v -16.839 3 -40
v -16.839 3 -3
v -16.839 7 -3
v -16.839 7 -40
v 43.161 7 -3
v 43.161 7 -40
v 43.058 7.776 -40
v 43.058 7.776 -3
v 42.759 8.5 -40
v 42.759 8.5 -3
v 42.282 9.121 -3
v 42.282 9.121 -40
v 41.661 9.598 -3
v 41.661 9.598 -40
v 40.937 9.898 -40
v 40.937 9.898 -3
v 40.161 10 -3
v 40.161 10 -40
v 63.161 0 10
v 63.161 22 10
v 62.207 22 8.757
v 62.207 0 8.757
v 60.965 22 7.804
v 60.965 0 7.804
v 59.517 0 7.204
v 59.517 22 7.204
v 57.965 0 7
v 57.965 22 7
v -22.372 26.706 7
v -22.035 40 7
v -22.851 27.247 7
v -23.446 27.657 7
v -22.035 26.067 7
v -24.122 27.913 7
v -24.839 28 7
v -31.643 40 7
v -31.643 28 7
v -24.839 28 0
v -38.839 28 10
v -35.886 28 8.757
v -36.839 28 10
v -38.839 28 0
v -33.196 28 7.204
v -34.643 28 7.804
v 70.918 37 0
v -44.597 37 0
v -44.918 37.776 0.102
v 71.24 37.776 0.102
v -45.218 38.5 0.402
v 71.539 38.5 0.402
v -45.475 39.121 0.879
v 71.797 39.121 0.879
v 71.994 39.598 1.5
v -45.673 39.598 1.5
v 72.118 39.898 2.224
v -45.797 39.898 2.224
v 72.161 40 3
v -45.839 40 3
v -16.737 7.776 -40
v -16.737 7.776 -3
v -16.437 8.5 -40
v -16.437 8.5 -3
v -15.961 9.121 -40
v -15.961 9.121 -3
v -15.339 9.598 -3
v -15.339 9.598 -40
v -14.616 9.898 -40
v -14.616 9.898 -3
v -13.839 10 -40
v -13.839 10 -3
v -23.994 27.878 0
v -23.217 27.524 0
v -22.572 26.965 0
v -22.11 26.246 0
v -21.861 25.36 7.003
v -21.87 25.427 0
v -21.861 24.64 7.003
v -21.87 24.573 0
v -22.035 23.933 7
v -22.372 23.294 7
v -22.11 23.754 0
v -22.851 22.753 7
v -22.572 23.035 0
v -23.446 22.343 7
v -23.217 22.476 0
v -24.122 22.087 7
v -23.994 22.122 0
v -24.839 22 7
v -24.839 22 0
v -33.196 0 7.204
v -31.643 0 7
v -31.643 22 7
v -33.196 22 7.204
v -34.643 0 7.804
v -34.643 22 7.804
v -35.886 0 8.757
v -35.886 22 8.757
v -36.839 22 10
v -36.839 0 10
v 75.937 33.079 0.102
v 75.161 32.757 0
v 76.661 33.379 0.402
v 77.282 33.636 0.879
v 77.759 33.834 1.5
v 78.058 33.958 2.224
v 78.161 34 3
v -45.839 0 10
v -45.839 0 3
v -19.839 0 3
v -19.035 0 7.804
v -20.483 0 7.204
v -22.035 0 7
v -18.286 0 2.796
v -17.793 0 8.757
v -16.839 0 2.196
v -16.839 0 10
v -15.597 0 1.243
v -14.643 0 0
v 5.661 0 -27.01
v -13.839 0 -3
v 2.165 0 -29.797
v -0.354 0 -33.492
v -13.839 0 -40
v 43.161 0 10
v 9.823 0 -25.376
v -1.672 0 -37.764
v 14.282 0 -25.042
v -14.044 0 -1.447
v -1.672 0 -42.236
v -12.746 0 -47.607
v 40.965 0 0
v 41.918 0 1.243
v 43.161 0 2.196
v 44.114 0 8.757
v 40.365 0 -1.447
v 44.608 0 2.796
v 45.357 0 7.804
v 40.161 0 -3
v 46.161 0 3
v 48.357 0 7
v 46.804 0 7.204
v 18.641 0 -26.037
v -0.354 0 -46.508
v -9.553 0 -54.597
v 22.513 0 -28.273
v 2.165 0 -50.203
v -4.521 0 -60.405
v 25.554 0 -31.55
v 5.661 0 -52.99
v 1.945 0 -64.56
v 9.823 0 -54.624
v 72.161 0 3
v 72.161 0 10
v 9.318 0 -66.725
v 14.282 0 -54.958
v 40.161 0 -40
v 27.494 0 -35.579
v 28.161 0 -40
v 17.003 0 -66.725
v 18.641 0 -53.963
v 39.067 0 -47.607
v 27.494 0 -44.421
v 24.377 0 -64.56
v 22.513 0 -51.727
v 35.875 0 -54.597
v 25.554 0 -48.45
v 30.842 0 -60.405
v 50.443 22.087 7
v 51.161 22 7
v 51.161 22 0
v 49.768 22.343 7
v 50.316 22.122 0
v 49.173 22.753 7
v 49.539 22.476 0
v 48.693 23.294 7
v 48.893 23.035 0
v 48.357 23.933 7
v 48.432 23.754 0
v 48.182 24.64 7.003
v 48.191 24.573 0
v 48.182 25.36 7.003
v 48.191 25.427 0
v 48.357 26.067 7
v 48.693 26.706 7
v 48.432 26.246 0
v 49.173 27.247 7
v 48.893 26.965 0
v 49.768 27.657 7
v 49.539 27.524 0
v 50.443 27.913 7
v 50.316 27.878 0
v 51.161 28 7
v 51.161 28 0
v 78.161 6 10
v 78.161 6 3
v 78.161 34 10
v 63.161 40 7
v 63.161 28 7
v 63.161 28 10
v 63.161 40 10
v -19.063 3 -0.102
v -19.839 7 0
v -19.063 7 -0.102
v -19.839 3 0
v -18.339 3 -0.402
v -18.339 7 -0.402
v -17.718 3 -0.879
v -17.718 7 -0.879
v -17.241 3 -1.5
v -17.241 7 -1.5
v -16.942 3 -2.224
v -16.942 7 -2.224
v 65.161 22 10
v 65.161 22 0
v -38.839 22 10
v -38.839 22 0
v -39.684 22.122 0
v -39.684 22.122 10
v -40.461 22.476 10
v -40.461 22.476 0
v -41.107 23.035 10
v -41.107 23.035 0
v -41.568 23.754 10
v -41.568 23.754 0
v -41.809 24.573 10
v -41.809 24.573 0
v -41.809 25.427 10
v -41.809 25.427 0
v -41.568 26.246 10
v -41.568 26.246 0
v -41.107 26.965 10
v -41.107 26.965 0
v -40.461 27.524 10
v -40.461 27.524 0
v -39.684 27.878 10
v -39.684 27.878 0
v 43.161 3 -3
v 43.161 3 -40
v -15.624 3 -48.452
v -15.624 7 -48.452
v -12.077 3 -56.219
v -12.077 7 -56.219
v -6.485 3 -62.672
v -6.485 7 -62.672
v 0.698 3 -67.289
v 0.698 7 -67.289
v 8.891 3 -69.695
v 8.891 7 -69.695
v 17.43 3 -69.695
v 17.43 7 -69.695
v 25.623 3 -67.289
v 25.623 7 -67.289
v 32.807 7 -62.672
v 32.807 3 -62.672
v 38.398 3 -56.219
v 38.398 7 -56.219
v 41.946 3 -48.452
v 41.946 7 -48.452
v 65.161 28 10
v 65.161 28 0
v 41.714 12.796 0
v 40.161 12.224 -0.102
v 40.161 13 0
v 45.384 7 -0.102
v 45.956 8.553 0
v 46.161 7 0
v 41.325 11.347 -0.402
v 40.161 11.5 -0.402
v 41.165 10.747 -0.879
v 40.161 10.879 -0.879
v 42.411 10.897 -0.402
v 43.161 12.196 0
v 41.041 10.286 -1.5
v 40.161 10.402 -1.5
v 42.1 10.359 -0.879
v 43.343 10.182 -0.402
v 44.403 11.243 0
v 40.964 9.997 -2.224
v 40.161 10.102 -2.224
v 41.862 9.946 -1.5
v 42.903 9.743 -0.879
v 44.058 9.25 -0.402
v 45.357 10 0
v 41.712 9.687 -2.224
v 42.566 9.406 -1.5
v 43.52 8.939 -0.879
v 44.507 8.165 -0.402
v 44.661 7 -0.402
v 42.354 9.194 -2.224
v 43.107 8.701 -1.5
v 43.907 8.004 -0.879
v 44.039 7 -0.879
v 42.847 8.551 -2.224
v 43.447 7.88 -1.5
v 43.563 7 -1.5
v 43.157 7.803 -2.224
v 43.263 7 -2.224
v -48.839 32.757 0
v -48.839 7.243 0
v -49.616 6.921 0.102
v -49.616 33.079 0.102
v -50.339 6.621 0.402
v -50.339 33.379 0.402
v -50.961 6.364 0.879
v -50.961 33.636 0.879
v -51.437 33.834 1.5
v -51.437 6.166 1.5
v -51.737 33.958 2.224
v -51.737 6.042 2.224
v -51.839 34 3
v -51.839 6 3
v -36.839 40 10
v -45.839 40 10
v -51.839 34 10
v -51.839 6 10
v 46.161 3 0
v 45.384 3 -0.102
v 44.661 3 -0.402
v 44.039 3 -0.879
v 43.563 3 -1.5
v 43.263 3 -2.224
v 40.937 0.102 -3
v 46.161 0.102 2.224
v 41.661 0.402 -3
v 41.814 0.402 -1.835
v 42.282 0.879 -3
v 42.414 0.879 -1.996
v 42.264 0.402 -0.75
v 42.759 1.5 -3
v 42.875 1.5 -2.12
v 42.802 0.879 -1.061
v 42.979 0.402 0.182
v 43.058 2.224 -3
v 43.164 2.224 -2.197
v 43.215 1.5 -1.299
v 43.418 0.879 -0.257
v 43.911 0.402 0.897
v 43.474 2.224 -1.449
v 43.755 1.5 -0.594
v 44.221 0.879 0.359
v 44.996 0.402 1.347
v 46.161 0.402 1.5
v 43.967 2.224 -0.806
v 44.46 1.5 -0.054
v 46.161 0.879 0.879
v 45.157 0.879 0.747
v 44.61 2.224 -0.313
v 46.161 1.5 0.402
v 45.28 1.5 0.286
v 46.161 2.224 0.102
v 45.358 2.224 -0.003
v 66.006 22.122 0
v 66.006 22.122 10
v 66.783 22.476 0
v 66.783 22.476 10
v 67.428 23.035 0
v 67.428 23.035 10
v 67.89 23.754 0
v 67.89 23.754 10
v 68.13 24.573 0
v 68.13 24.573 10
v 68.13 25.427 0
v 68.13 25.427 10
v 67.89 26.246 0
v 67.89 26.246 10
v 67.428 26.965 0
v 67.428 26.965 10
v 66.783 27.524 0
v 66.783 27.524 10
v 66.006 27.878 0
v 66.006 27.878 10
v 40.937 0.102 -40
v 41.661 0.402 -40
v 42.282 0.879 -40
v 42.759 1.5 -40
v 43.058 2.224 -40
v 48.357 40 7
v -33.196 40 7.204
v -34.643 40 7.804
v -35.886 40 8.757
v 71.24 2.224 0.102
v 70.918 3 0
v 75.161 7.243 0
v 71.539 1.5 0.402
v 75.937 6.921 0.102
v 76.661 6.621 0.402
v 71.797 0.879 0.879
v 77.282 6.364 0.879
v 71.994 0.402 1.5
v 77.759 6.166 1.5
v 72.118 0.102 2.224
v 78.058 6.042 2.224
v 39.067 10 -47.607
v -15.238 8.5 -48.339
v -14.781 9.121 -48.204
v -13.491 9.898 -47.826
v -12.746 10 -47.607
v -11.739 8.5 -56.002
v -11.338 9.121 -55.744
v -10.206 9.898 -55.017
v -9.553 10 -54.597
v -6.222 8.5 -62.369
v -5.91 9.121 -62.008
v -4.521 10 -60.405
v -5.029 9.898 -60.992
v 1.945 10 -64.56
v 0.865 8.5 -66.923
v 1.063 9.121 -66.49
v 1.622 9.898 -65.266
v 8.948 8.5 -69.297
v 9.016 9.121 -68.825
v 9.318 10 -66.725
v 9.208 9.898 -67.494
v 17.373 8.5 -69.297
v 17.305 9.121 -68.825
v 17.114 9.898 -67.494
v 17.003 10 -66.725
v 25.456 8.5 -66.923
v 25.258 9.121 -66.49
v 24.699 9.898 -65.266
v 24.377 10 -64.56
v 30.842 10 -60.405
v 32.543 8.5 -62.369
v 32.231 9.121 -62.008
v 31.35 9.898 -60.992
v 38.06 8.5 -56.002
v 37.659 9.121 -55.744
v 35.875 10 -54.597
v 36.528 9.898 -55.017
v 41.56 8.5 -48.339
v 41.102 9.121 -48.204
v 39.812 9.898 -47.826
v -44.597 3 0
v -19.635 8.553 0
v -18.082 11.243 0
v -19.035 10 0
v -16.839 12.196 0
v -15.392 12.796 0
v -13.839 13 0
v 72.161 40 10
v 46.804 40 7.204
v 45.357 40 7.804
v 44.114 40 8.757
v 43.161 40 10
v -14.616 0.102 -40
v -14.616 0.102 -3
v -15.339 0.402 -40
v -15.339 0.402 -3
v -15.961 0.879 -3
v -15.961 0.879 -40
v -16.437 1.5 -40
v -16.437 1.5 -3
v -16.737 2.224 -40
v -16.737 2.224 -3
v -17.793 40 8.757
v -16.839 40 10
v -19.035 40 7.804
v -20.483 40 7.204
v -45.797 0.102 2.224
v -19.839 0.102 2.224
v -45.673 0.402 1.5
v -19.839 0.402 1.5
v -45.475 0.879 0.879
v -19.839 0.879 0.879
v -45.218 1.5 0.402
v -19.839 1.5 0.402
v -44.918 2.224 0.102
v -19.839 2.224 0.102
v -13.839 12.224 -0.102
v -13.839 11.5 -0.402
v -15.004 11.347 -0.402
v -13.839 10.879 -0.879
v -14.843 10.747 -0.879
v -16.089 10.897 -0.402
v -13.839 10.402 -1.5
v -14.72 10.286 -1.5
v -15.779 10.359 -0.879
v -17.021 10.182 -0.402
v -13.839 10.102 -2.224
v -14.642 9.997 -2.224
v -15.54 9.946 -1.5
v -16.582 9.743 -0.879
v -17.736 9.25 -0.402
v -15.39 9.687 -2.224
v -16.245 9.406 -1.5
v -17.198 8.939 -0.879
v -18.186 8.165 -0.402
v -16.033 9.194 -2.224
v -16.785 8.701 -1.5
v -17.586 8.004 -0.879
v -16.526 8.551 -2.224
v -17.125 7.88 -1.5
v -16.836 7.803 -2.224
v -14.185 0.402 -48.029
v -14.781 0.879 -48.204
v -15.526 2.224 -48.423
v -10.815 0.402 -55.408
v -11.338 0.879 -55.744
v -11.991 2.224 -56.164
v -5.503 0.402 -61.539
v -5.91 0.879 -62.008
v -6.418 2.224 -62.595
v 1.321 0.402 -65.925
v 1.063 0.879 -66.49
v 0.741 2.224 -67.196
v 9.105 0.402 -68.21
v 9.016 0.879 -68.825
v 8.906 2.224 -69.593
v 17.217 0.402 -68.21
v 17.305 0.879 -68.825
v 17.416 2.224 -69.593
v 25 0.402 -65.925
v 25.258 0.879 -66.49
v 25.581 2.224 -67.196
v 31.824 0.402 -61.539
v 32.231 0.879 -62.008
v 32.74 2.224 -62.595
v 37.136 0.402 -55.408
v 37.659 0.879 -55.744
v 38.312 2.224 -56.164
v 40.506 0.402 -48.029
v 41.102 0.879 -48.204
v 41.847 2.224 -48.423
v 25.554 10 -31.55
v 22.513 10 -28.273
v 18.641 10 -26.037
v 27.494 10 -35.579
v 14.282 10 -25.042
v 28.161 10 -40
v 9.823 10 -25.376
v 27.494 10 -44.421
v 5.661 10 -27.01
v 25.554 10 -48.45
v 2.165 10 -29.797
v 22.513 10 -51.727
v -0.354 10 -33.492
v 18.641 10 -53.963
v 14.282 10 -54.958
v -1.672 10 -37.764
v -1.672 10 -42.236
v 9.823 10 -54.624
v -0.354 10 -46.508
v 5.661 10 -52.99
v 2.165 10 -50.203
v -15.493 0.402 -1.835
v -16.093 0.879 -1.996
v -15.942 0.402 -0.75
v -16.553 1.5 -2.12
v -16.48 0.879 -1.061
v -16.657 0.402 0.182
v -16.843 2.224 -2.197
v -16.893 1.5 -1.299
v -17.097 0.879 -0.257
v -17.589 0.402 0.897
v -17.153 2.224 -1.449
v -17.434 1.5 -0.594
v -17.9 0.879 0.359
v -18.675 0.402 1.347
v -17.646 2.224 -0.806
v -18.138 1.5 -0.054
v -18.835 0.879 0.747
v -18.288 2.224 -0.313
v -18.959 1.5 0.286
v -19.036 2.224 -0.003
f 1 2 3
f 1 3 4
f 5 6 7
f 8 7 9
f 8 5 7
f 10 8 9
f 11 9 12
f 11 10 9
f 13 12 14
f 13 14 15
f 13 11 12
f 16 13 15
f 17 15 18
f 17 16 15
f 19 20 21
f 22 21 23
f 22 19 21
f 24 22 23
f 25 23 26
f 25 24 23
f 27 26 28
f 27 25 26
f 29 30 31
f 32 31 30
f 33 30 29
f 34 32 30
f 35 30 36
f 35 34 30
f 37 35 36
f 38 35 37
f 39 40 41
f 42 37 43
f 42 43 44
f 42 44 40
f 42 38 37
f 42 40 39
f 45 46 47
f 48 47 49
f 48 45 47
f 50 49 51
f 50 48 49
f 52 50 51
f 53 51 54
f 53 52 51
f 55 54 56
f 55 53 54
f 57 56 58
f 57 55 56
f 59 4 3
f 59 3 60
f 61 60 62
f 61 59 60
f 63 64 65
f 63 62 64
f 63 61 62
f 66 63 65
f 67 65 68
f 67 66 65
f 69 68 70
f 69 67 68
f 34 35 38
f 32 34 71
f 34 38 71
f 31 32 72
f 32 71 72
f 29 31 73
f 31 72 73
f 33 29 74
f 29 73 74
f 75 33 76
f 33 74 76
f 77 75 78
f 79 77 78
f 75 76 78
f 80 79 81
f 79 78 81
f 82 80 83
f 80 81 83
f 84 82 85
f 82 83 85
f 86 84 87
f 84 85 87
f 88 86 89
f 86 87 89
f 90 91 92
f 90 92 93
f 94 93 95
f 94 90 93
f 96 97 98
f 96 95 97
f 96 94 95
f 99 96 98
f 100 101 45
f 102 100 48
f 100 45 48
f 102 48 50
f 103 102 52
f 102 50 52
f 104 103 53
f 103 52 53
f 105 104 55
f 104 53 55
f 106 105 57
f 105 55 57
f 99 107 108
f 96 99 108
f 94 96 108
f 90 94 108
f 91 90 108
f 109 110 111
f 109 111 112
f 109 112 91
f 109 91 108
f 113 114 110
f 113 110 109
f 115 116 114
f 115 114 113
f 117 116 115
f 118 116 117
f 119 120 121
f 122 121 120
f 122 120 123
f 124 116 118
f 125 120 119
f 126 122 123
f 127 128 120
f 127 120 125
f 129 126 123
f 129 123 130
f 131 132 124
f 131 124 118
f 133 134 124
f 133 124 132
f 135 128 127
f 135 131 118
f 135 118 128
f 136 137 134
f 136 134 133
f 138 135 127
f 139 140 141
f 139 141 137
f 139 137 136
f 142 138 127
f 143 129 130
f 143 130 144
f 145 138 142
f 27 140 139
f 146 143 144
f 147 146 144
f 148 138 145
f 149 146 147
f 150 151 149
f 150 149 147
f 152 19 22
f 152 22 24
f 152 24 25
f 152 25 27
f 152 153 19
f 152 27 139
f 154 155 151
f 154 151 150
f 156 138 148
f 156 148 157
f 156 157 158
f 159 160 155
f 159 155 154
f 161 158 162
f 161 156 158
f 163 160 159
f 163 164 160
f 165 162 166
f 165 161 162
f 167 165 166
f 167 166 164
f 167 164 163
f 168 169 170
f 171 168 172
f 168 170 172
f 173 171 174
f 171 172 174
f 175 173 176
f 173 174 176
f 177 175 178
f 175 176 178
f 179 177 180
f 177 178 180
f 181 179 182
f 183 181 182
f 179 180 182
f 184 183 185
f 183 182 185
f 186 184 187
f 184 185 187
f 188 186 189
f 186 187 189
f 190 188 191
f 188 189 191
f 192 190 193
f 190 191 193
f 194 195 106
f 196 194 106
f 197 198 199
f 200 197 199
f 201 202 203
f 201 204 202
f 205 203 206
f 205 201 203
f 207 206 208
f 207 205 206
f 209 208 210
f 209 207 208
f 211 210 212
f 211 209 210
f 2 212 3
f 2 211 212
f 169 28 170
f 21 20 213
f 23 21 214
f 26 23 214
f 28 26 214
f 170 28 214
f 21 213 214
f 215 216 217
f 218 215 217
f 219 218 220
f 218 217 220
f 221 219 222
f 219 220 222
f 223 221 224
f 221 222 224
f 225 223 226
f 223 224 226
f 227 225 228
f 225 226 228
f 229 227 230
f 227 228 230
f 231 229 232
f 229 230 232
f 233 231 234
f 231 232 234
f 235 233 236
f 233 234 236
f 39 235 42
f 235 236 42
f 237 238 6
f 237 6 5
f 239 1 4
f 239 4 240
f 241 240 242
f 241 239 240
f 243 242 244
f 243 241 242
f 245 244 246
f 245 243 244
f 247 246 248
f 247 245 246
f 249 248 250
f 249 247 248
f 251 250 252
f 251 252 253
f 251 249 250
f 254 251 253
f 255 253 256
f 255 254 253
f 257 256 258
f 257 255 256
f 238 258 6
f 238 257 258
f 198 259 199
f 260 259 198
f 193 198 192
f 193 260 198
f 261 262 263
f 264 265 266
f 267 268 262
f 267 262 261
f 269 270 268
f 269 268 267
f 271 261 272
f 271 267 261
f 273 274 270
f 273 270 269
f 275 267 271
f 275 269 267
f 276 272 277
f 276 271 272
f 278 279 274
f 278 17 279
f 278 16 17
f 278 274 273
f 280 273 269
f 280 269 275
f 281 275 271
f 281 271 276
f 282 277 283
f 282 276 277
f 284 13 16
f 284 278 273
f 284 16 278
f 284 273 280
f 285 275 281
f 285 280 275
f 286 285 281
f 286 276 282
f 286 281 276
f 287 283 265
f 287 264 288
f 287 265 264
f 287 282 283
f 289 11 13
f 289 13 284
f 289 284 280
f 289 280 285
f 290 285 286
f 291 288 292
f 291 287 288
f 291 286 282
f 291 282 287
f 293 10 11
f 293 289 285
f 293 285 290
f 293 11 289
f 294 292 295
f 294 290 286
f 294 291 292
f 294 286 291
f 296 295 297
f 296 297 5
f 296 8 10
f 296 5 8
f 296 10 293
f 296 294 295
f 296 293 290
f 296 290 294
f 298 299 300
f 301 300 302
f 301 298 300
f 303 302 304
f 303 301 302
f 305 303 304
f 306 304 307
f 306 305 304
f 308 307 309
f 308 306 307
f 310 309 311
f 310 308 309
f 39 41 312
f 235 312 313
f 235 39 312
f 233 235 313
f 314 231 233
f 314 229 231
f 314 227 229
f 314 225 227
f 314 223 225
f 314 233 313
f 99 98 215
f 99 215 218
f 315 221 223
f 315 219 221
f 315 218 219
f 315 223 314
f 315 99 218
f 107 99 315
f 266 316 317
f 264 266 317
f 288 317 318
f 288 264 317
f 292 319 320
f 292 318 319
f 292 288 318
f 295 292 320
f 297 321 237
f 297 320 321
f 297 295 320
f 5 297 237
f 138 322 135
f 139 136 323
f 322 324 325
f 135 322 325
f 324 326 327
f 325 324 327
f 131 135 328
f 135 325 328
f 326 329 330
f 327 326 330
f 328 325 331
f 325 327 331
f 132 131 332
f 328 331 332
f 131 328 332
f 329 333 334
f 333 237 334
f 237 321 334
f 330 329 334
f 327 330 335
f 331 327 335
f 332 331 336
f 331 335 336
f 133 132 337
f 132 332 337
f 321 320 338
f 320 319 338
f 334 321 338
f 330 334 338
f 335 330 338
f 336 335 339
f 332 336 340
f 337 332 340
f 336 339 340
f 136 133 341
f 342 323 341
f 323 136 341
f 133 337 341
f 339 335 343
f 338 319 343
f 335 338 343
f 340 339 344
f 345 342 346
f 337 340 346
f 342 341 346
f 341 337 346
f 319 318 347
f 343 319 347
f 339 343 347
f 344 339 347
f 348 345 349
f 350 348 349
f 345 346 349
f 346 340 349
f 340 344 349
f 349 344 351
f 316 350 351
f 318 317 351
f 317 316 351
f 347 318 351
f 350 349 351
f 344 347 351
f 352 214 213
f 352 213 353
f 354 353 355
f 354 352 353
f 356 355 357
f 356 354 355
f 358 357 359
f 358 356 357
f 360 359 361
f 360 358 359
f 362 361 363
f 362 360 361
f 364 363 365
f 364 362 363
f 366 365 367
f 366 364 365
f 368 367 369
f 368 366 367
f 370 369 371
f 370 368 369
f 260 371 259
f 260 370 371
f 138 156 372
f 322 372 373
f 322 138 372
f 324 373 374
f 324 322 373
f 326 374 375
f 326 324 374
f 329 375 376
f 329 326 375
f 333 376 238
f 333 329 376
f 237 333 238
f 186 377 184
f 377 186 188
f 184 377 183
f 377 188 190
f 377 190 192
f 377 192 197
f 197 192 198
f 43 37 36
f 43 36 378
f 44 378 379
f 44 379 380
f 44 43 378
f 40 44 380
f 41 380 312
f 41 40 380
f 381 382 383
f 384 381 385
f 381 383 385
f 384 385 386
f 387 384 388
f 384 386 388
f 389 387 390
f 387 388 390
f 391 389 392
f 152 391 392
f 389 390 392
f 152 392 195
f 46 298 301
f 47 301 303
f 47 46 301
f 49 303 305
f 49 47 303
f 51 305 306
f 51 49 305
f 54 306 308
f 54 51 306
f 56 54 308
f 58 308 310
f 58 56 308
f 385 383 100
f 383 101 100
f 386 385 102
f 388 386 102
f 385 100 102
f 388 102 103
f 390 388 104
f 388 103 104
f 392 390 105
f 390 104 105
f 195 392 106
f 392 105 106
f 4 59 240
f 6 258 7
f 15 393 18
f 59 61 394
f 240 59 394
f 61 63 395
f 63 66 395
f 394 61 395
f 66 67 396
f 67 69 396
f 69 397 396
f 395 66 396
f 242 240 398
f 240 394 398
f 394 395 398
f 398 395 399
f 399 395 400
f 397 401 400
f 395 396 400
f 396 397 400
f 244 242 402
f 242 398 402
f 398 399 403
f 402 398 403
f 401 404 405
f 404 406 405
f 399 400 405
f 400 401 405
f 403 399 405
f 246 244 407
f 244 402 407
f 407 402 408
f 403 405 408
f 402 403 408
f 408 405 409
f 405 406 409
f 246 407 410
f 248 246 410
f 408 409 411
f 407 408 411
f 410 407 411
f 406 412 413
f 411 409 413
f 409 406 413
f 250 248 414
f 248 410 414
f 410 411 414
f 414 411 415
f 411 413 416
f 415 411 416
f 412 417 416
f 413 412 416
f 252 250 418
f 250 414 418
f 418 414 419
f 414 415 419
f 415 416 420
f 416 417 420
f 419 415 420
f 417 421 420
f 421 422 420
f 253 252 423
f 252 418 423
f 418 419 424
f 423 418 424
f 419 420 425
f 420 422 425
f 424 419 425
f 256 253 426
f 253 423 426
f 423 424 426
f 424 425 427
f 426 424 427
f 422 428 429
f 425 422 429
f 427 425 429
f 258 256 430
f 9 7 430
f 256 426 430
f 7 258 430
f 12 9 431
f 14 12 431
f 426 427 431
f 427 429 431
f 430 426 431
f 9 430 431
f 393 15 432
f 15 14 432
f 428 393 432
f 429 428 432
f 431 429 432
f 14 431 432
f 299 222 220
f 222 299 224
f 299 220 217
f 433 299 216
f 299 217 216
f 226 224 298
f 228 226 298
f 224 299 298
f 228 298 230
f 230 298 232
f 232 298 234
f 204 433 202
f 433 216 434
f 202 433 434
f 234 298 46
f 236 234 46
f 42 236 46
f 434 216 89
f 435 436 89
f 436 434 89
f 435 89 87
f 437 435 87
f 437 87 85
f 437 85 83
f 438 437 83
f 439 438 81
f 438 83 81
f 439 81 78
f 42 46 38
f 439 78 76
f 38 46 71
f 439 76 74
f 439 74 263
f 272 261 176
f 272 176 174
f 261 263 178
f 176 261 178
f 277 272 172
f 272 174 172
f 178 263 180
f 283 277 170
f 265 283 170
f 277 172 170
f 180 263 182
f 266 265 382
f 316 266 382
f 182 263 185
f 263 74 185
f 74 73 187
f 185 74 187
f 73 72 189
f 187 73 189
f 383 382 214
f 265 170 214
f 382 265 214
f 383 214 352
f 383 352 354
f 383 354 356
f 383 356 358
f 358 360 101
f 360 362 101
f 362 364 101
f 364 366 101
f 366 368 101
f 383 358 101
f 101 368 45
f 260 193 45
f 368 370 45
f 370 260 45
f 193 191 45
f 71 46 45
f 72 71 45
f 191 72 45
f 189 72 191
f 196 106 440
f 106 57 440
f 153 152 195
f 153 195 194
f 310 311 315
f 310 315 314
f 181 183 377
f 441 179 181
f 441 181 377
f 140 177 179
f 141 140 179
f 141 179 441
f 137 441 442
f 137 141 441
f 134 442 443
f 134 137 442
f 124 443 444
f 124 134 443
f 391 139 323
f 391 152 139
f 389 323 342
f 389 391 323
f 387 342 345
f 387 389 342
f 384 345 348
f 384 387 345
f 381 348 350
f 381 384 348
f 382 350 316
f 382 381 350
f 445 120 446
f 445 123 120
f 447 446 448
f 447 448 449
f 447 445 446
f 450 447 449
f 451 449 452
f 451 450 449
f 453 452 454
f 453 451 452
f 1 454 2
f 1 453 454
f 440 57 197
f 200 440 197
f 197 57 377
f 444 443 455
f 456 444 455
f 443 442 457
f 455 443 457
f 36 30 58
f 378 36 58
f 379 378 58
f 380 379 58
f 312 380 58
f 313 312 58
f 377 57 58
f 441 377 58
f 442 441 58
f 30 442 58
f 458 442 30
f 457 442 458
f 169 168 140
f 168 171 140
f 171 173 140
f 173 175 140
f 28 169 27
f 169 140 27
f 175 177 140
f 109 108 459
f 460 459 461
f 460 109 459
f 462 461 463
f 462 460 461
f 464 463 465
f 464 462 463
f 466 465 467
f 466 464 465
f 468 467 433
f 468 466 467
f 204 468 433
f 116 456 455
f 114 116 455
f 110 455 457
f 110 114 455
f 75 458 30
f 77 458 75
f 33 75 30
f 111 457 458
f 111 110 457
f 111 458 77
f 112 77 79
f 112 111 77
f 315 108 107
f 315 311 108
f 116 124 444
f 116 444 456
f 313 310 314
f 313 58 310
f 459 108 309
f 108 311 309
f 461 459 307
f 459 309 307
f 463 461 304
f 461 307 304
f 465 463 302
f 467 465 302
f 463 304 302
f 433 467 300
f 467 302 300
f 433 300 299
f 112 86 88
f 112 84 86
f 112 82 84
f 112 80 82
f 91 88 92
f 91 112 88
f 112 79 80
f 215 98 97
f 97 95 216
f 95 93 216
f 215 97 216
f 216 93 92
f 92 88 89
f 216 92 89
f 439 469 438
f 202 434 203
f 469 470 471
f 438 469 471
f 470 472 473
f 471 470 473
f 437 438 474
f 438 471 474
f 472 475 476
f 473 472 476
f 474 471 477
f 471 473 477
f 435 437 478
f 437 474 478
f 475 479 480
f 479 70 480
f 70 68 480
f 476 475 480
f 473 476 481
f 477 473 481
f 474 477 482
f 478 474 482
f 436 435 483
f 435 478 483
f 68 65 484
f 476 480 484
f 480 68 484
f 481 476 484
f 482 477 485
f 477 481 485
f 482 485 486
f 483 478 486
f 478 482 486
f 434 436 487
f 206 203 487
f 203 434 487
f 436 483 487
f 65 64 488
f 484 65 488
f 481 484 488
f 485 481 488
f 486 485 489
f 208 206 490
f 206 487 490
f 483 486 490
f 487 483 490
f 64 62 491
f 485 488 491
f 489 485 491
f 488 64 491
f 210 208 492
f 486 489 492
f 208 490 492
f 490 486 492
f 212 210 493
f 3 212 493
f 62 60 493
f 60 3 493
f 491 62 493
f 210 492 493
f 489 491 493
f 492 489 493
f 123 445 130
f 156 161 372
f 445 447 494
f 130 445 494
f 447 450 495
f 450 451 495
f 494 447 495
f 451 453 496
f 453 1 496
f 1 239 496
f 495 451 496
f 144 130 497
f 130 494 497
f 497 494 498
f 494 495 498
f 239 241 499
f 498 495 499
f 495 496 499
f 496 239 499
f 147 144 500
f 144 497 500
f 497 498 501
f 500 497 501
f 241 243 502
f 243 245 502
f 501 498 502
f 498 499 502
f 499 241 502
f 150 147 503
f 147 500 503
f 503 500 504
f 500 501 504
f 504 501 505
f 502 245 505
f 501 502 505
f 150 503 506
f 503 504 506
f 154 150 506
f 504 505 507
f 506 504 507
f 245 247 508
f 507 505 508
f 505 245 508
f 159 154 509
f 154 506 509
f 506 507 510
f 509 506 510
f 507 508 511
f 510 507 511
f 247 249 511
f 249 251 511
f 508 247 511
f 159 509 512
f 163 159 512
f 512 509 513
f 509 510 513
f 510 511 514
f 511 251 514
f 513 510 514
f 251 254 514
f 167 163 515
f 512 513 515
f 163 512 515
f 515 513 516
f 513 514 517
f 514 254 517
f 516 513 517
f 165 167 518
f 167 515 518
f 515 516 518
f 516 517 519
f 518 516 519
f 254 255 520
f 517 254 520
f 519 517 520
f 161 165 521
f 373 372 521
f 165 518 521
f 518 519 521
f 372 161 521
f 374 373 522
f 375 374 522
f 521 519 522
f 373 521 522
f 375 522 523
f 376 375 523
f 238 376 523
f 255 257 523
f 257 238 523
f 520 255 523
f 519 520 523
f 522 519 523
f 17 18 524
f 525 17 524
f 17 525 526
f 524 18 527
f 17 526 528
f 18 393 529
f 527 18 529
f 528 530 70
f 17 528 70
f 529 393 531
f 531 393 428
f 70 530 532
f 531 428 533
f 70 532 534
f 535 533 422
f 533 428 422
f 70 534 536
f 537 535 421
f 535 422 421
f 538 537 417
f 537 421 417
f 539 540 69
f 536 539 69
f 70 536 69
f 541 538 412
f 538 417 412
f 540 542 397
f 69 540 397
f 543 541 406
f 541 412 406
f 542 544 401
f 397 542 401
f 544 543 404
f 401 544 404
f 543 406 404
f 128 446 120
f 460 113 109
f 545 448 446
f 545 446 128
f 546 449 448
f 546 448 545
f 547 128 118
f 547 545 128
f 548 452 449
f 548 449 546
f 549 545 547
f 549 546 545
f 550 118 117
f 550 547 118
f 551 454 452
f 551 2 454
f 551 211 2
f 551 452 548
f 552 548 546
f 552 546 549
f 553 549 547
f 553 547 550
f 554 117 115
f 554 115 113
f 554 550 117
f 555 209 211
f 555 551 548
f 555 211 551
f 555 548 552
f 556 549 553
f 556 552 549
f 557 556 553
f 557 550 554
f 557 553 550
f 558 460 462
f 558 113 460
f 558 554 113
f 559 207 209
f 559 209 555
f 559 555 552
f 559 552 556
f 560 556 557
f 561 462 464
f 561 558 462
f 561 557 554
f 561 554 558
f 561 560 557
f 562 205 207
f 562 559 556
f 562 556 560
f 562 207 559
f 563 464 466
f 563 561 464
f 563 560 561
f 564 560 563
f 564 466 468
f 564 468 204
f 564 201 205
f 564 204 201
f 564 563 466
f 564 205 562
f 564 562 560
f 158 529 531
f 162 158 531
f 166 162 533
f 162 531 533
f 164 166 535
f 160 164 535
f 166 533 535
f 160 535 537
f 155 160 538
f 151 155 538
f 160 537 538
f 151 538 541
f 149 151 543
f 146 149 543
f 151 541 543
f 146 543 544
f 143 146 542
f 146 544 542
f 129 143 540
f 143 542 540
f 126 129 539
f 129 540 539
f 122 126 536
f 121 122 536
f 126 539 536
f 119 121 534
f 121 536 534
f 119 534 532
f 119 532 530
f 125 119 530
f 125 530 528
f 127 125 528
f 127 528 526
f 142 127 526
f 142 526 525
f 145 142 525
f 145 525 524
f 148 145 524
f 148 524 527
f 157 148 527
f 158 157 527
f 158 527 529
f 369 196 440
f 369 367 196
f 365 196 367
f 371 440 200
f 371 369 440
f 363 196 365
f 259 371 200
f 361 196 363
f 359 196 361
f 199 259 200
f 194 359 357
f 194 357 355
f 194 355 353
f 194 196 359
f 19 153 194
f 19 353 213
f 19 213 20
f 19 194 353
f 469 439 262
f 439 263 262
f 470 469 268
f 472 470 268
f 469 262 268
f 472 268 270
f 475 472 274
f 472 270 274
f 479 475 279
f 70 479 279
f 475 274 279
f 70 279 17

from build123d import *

# Parameters (mm, degrees)
ESQUISSE1_W             = 130
ESQUISSE1_H             = 40
BASE_DEPTH              = 10
CHANFREIN1_SIZE         = 6
CHANFREIN2_SIZE         = 6
LANGUETTE_EXT_DEPTH     = 10
D_GAGEMENT_M31_D        = 30
ENL_V_MAT_EXTRU_1_REACH = 114.29
ESQUISSE5_W             = 20
ESQUISSE5_H             = 3
RAINURE_REACH           = 114.29
CONGES3MM_R             = 3
CONGES6MM_R             = 6


with BuildPart() as part:
    # Esquisse1 → Base (new body)
    with BuildSketch(Plane.XY):
        with Locations((13.160714286, 20)):
            Rectangle(ESQUISSE1_W, ESQUISSE1_H)
    extrude(amount=BASE_DEPTH)

    # Chanfrein1
    chanfrein1_edges = [part.edges().sort_by_distance(p)[0] for p in [
        (78.160714286, 0, 5),
    ]]
    chamfer(chanfrein1_edges, length=CHANFREIN1_SIZE)

    # Chanfrein2
    chanfrein2_edges = [part.edges().sort_by_distance(p)[0] for p in [
        (-51.839285714, 40, 5),
        (78.160714286, 40, 5),
        (-51.839285714, 0, 5),
    ]]
    chamfer(chanfrein2_edges, length=CHANFREIN2_SIZE)

    # languette → Languette_Ext (add)
    with BuildSketch(Plane(origin=(0, 0, 0), x_dir=(1, 0, 0), z_dir=(0, 1, 0))):
        with BuildLine():
            Line((-16.839285714, -10), (-16.839285714, 40))
            ThreePointArc((-16.839285714, 40), (13.160714286, 70), (43.160714286, 40))
            Line((43.160714286, 40), (43.160714286, -10))
            Line((43.160714286, -10), (-16.839285714, -10))
        make_face()
    extrude(amount=LANGUETTE_EXT_DEPTH)

    # Dégagement M31 (through all)
    with Locations(Plane(origin=(0, 0, 0), x_dir=(-1, 0, 0), z_dir=(0, -1, 0))):
        with Locations((-13.160714286, 40)):
            Hole(D_GAGEMENT_M31_D / 2)

    # Esquisse5 → Enlèv. mat.-Extru.1 (cut, up to next)
    with BuildSketch(Plane.XZ, mode=Mode.PRIVATE) as enl_v_mat_extru_1_sk1:
        with Locations((53.160714286, 8.5)):
            Rectangle(ESQUISSE5_W, ESQUISSE5_H)
    enl_v_mat_extru_1_tool1 = extrude(enl_v_mat_extru_1_sk1.sketch, amount=-ENL_V_MAT_EXTRU_1_REACH, mode=Mode.PRIVATE) & part.part
    enl_v_mat_extru_1 = enl_v_mat_extru_1_tool1.solids().sort_by_distance((53.160714, 0, 8.5))[0]
    add(enl_v_mat_extru_1, mode=Mode.SUBTRACT)

    # Symétrie1: Enlèv. mat.-Extru.1 across plane
    add(enl_v_mat_extru_1.mirror(Plane(origin=(13.160714286, 0, 0), x_dir=(0, 0, 1), z_dir=(1, 0, 0))), mode=Mode.SUBTRACT)

    # Esquisse7 → Rainure (cut, up to next)
    with BuildSketch(Plane(origin=(0, 0, 0), x_dir=(-1, 0, 0), z_dir=(0, 0, -1)), mode=Mode.PRIVATE) as rainure_sk1:
        with BuildLine():
            Line((-65.160714286, 28), (-51.160714286, 28))
            ThreePointArc((-51.160714286, 28), (-48.160714286, 25), (-51.160714286, 22))
            Line((-51.160714286, 22), (-65.160714286, 22))
            ThreePointArc((-65.160714286, 22), (-68.160714286, 25), (-65.160714286, 28))
        make_face()
    rainure_tool1 = extrude(rainure_sk1.sketch, amount=-RAINURE_REACH, mode=Mode.PRIVATE) & part.part
    rainure = rainure_tool1.solids().sort_by_distance((58.160714, 25, 0))[0]
    add(rainure, mode=Mode.SUBTRACT)

    # Symétrie2: Rainure across plane
    add(rainure.mirror(Plane(origin=(13.160714286, 0, 0), x_dir=(0, 0, 1), z_dir=(1, 0, 0))), mode=Mode.SUBTRACT)

    # Conges3mm
    conges3mm_edges = [part.edges().sort_by_distance(p)[0] for p in [
        (78.160714286, 20, 0),
        (75.160714286, 3, 0),
        (-51.839285714, 20, 0),
        (-31.339285714, 0, 0),
        (13.160714286, 40, 0),
        (75.160714286, 37, 0),
        (-48.839285714, 3, 0),
        (-48.839285714, 37, 0),
        (57.660714286, 0, 0),
        (13.160714286, 10, 0),
        (-16.839285714, 5, 0),
        (43.160714286, 5, 0),
        (43.160714286, 0, -20),
        (13.160714286, 0, -70),
        (-16.839285714, 0, -20),
        (43.160714286, 10, -20),
        (13.160714286, 10, -70),
        (-16.839285714, 10, -20),
    ]]
    fillet(conges3mm_edges, radius=CONGES3MM_R)

    # Conges6mm
    # the kernel refuses this fillet: 6 mm, written as the material it adds along each edge
    with BuildSketch(Plane(origin=(-36.839285714, 15.009618943, 7), x_dir=(1, 0, 0), z_dir=(0, 1, 0))) as conges6mm_piece_1_section:
        with BuildLine():
            CenterArc((5.196152423, -6), CONGES6MM_R, 90, 60)
            Line((0, -3), (0, 0))
            Line((0, 0), (5.196152423, 0))
        make_face()
    conges6mm_piece_1 = extrude(amount=37.980762114, mode=Mode.PRIVATE)
    conges6mm_piece_1 = split(conges6mm_piece_1, bisect_by=Plane(origin=(-34.649133292, 22, 7.793455272), z_dir=(0, -1, 0)), keep=Keep.TOP, mode=Mode.PRIVATE)
    add(conges6mm_piece_1)
    with BuildSketch(Plane(origin=(-36.839285714, 28, 7), x_dir=(1, 0, 0), z_dir=(0, 1, 0))) as conges6mm_piece_2:
        with BuildLine():
            CenterArc((5.196152423, -6), CONGES6MM_R, 90, 60)
            Line((0, -3), (0, 0))
            Line((0, 0), (5.196152423, 0))
        make_face()
    extrude(amount=12)
    with BuildSketch(Plane(origin=(-36.839285714, 0, 7), x_dir=(1, 0, 0), z_dir=(0, 1, 0))) as conges6mm_piece_3:
        with BuildLine():
            CenterArc((5.196152423, -6), CONGES6MM_R, 90, 60)
            Line((0, -3), (0, 0))
            Line((0, 0), (5.196152423, 0))
        make_face()
    extrude(amount=22)
    with BuildSketch(Plane(origin=(-36.839285714, -12.990381057, 7), x_dir=(1, 0, 0), z_dir=(0, 1, 0))) as conges6mm_piece_4_section:
        with BuildLine():
            CenterArc((5.196152423, -6), CONGES6MM_R, 90, 60)
            Line((0, -3), (0, 0))
            Line((0, 0), (5.196152423, 0))
        make_face()
    conges6mm_piece_4 = extrude(amount=47.980762114, mode=Mode.PRIVATE)
    conges6mm_piece_4 = split(conges6mm_piece_4, bisect_by=Plane(origin=(-34.649133292, 28, 7.793455272), z_dir=(0, 1, 0)), keep=Keep.TOP, mode=Mode.PRIVATE)
    add(conges6mm_piece_4)
    with BuildSketch(Plane(origin=(-16.839285714, 0, 7), x_dir=(0, 0, 1), z_dir=(0, 1, 0))) as conges6mm_piece_5_section:
        with BuildLine():
            CenterArc((6, -5.196152423), CONGES6MM_R, 120, 60)
            Line((0, -5.196152423), (0, 0))
            Line((0, 0), (3, 0))
        make_face()
    conges6mm_piece_5 = extrude(amount=40, mode=Mode.PRIVATE)
    conges6mm_piece_5 = conges6mm_piece_5 - Plane(origin=(-24.839285714, 25, 7.793455272), x_dir=(0, 1, 0), z_dir=(0, 0, -1)) * Cylinder(3, 101, mode=Mode.PRIVATE)
    add(conges6mm_piece_5)
    with BuildSketch(Plane(origin=(43.160714286, 0, 7), x_dir=(1, 0, 0), z_dir=(0, 1, 0))) as conges6mm_piece_6_section:
        with BuildLine():
            CenterArc((5.196152423, -6), CONGES6MM_R, 90, 60)
            Line((0, -3), (0, 0))
            Line((0, 0), (5.196152423, 0))
        make_face()
    conges6mm_piece_6 = extrude(amount=40, mode=Mode.PRIVATE)
    conges6mm_piece_6 = conges6mm_piece_6 - Plane(origin=(51.160714286, 25, 7.793455272), x_dir=(0, 1, 0), z_dir=(0, 0, -1)) * Cylinder(3, 101, mode=Mode.PRIVATE)
    add(conges6mm_piece_6)
    with BuildSketch(Plane(origin=(63.160714286, 0, 7), x_dir=(0, 0, 1), z_dir=(0, 1, 0))) as conges6mm_piece_7:
        with BuildLine():
            CenterArc((6, -5.196152423), CONGES6MM_R, 120, 60)
            Line((0, -5.196152423), (0, 0))
            Line((0, 0), (3, 0))
        make_face()
    extrude(amount=22)


solid = part.part
